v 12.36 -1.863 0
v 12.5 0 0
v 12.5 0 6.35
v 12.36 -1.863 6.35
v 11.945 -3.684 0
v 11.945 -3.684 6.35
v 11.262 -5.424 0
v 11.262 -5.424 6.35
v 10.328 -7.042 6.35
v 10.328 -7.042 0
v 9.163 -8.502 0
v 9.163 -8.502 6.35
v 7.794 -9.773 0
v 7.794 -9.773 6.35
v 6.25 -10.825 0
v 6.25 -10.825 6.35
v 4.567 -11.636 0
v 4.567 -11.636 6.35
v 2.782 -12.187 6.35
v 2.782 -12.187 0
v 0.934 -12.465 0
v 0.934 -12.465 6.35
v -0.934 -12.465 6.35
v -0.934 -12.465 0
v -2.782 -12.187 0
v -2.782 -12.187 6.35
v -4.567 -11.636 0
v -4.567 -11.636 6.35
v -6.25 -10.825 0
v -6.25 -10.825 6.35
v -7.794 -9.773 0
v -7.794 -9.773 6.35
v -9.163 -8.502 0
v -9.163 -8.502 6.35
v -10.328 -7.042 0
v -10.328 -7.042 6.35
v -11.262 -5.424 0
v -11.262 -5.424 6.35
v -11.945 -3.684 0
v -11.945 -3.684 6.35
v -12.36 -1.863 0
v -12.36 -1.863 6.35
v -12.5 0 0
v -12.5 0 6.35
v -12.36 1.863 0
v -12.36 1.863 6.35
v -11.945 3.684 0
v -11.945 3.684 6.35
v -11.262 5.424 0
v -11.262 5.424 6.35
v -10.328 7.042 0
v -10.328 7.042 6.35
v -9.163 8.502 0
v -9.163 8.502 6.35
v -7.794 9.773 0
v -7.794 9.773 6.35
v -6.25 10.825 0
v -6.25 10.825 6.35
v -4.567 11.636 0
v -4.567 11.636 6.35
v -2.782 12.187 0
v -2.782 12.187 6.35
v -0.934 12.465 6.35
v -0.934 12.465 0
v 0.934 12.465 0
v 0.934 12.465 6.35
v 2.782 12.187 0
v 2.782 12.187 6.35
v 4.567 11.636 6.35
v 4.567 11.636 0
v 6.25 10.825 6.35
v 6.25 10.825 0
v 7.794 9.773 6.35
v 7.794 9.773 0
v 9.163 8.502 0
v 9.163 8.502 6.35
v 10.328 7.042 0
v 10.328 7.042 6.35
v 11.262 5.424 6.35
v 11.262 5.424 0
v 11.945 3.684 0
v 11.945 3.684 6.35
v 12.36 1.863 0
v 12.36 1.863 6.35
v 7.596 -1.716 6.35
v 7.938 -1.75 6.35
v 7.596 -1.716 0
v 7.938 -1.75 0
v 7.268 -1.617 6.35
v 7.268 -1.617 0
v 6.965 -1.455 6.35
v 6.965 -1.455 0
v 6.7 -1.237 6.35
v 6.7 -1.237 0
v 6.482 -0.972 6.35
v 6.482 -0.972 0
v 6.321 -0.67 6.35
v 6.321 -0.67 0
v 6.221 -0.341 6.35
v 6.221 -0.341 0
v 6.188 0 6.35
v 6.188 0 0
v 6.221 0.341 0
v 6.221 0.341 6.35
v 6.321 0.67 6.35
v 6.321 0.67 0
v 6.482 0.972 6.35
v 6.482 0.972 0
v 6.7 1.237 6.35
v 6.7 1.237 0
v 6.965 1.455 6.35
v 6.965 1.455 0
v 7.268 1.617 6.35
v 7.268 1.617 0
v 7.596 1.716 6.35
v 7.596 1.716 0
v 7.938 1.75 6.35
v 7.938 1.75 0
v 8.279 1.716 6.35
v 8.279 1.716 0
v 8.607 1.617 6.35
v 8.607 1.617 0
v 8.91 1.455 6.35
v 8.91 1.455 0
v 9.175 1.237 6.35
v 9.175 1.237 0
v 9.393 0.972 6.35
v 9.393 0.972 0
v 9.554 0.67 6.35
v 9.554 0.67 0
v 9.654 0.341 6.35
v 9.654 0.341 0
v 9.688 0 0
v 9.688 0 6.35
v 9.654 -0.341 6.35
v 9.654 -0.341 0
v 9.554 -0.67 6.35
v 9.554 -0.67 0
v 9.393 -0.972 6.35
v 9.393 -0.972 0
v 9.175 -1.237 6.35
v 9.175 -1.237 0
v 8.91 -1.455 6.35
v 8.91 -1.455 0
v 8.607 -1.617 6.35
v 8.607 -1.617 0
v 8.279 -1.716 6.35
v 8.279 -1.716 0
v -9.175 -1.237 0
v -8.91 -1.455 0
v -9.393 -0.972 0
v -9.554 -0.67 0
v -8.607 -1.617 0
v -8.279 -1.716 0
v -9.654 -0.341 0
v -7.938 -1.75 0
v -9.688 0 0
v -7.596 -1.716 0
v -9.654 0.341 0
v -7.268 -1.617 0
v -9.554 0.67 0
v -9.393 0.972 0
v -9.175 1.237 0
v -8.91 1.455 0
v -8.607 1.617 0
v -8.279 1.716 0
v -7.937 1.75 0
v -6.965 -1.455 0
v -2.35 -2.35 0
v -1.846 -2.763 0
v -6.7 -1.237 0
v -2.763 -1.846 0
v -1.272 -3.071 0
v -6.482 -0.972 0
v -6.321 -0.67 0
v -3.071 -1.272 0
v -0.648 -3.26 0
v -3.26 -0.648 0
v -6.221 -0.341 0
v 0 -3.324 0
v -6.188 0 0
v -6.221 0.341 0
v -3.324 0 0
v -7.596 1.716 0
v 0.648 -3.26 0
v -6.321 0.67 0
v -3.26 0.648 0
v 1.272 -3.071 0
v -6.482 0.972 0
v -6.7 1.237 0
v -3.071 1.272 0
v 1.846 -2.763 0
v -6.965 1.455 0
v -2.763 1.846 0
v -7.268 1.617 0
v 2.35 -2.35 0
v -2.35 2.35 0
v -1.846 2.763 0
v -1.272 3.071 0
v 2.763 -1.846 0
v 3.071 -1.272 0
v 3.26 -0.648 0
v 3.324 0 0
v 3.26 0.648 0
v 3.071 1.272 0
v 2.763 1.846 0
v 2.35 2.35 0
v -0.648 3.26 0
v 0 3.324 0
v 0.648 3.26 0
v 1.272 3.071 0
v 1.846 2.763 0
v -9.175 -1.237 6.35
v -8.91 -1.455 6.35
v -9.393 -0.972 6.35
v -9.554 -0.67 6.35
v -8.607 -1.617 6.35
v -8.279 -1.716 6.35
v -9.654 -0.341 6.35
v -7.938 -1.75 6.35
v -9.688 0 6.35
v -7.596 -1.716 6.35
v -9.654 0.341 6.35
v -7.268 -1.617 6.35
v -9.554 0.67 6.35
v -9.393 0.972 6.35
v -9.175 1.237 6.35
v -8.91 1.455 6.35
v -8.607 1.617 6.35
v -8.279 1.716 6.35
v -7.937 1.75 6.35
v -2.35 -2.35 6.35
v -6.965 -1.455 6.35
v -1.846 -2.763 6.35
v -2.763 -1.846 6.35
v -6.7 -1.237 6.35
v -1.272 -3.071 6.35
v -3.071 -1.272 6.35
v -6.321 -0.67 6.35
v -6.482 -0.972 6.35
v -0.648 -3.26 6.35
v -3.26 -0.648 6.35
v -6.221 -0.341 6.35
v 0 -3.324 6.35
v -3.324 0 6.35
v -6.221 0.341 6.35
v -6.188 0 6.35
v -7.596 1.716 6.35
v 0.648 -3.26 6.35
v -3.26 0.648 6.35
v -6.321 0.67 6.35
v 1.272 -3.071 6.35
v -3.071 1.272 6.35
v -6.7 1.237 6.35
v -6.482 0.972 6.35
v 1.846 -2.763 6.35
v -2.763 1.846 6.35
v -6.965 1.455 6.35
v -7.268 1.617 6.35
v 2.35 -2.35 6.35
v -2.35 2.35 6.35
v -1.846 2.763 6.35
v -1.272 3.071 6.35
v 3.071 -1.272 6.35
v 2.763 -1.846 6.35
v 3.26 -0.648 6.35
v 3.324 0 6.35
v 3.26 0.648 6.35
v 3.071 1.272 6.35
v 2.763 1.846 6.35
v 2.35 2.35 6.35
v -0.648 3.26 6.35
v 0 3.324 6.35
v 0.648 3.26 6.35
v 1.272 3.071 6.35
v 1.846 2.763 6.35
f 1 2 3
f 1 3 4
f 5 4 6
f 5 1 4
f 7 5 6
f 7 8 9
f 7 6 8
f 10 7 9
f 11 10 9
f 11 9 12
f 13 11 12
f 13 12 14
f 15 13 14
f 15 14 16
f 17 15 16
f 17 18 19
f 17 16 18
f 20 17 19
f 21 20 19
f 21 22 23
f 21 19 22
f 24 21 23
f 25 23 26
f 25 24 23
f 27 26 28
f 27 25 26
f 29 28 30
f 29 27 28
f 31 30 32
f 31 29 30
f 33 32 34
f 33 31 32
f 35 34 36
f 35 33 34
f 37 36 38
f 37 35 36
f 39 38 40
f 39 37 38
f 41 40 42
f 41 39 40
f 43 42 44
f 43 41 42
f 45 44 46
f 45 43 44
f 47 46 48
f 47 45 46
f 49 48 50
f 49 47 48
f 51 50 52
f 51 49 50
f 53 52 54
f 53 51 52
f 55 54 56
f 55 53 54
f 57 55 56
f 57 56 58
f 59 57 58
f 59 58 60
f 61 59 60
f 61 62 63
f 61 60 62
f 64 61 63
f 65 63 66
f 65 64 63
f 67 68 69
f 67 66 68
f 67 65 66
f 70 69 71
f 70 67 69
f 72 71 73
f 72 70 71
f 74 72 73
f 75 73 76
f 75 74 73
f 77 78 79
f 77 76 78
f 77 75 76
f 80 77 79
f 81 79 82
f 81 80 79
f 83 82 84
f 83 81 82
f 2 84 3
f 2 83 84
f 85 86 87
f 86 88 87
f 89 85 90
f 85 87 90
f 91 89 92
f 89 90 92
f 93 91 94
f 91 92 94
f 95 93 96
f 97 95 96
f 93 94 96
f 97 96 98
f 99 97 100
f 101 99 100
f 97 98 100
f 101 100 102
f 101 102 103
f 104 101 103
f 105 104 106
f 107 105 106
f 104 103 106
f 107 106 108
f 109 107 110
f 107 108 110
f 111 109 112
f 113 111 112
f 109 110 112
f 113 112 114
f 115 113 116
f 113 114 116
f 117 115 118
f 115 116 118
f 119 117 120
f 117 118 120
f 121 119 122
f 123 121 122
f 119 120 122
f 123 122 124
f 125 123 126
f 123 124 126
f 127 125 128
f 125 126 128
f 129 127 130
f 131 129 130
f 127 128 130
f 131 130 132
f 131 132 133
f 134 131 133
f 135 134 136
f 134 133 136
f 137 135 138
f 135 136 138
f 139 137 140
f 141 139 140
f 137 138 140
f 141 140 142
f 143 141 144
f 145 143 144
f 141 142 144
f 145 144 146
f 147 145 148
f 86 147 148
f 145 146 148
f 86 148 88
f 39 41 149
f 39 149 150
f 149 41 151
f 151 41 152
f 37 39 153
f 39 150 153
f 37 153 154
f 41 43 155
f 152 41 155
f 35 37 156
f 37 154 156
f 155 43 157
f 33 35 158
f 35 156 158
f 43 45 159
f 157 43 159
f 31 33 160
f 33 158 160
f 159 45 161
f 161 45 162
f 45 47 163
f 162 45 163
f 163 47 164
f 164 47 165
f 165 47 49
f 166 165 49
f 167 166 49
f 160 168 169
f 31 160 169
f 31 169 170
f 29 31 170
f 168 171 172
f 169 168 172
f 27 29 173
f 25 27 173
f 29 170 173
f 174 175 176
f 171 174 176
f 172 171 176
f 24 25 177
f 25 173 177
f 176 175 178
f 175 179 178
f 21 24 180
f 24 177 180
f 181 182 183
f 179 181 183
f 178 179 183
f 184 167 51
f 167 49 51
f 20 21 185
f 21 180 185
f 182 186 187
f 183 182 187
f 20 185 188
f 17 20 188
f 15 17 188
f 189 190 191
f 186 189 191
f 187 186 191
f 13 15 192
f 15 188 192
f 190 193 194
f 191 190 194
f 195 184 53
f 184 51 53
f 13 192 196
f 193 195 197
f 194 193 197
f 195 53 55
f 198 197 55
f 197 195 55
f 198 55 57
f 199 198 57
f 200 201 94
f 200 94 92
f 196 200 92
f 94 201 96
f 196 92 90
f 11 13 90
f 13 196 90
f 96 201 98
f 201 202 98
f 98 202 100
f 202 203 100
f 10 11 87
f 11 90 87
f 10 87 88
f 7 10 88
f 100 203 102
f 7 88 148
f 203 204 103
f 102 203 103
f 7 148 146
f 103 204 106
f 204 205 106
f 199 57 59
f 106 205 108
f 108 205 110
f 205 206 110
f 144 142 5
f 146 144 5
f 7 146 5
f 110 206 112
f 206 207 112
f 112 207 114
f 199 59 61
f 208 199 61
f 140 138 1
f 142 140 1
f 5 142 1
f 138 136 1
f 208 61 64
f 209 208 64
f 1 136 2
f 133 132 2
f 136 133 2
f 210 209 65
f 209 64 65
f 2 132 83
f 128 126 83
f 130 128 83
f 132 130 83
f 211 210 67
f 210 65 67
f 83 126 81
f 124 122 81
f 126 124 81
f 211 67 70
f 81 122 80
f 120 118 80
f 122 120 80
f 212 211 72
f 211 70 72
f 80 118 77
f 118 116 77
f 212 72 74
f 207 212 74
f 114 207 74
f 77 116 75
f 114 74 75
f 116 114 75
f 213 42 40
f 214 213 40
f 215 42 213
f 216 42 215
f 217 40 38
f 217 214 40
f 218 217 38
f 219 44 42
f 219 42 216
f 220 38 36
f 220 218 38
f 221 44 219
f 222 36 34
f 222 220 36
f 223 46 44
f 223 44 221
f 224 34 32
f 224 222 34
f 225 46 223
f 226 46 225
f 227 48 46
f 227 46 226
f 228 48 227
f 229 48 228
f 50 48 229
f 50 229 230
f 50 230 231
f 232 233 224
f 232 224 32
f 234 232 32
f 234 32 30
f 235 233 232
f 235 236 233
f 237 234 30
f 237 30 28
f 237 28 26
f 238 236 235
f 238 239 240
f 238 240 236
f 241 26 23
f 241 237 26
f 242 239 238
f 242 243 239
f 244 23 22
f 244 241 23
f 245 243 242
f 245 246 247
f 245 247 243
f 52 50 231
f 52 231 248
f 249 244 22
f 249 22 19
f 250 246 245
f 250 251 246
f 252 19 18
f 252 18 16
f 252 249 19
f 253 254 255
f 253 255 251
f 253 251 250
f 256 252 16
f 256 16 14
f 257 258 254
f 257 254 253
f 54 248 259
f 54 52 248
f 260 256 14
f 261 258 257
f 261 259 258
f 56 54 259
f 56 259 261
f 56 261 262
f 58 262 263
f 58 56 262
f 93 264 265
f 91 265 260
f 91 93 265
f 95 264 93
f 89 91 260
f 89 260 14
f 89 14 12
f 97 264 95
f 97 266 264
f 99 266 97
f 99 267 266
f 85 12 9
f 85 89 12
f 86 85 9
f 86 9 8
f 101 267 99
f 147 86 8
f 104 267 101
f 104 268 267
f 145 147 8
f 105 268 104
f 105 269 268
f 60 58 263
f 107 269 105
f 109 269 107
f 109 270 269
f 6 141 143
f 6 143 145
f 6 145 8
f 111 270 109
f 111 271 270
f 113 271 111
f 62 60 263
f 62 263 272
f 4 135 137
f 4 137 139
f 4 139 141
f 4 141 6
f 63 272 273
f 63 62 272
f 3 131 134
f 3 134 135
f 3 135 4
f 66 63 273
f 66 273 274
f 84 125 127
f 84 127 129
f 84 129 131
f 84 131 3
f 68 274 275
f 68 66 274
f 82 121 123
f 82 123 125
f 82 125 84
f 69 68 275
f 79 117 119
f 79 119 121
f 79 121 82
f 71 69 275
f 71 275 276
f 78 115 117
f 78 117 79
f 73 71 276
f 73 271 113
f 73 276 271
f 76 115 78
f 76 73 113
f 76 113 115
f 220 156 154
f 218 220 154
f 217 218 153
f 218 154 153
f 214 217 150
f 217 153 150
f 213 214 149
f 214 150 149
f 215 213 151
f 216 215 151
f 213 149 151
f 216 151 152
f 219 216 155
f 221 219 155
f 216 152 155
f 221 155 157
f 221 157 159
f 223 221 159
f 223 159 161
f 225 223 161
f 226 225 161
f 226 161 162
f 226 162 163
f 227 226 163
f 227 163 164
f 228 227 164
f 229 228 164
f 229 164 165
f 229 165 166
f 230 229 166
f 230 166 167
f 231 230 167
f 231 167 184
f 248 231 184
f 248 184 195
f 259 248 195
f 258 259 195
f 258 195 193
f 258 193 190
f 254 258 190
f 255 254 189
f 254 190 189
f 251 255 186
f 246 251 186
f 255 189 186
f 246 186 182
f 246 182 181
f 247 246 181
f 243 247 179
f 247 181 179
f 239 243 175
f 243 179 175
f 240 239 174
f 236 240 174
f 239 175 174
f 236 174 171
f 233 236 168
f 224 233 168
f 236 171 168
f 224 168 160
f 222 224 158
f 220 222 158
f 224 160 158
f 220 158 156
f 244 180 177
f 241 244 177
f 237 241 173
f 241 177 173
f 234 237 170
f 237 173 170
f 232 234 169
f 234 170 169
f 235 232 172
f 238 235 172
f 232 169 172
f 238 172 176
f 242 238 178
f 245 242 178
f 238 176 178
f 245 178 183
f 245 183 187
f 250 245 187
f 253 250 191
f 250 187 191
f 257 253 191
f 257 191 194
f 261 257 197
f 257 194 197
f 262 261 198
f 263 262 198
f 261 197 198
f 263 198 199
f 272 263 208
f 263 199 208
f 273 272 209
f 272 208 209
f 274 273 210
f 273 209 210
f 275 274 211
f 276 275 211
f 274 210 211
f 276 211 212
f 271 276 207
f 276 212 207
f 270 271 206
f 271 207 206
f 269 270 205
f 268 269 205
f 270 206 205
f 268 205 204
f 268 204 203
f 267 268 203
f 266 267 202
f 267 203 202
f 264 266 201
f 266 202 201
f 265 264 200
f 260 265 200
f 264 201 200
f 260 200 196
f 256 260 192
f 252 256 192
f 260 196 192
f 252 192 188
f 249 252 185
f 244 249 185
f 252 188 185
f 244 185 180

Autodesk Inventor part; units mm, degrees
ref_plane "YZ Plane" through (0, 0, 0) normal (1, 0, 0) x (0, 1, 0)
ref_plane "XZ Plane" through (0, 0, 0) normal (0, 1, 0) x (-1, 0, 0)
ref_plane "XY Plane" through (0, 0, 0) normal (0, 0, 1) x (1, 0, 0)
sketch "Sketch1" plane through (0, 0, 0) normal (0, 0, 1) x (1, 0, 0)
  circle A0 centre (0, 0) radius 12.5
  dimension "d0" = 25
extrude "Extrusion1" add sketch "Sketch1" along normal blind 6.35
sketch "Sketch2" plane through (0, 0, 6.35) normal (0, 0, 1) x (1, 0, 0)
  circle A0 centre (0, 0) radius 12.5 projected
hole "Hole1" at (0, 0, 6.35) direction (0, 0, -1) diameter 6.647 end through all thread size "M8x1.25" class "6H" standard "ANSI Metric M Profile"
sketch "Sketch3" plane through (0, 0, 6.35) normal (0, 0, 1) x (1, 0, 0)
  line L0 (-7.9375, 0) -> (7.9375, 0) construction
  point P0 (0, 0)
  point P1 (0, 0)
  dimension "d10" = 15.875
hole "Hole2" at (-7.9375, 0, 6.35) at (7.9375, 0, 6.35) direction (0, 0, -1) diameter 3.5 end through all
properties part number "Spanner Nut"
